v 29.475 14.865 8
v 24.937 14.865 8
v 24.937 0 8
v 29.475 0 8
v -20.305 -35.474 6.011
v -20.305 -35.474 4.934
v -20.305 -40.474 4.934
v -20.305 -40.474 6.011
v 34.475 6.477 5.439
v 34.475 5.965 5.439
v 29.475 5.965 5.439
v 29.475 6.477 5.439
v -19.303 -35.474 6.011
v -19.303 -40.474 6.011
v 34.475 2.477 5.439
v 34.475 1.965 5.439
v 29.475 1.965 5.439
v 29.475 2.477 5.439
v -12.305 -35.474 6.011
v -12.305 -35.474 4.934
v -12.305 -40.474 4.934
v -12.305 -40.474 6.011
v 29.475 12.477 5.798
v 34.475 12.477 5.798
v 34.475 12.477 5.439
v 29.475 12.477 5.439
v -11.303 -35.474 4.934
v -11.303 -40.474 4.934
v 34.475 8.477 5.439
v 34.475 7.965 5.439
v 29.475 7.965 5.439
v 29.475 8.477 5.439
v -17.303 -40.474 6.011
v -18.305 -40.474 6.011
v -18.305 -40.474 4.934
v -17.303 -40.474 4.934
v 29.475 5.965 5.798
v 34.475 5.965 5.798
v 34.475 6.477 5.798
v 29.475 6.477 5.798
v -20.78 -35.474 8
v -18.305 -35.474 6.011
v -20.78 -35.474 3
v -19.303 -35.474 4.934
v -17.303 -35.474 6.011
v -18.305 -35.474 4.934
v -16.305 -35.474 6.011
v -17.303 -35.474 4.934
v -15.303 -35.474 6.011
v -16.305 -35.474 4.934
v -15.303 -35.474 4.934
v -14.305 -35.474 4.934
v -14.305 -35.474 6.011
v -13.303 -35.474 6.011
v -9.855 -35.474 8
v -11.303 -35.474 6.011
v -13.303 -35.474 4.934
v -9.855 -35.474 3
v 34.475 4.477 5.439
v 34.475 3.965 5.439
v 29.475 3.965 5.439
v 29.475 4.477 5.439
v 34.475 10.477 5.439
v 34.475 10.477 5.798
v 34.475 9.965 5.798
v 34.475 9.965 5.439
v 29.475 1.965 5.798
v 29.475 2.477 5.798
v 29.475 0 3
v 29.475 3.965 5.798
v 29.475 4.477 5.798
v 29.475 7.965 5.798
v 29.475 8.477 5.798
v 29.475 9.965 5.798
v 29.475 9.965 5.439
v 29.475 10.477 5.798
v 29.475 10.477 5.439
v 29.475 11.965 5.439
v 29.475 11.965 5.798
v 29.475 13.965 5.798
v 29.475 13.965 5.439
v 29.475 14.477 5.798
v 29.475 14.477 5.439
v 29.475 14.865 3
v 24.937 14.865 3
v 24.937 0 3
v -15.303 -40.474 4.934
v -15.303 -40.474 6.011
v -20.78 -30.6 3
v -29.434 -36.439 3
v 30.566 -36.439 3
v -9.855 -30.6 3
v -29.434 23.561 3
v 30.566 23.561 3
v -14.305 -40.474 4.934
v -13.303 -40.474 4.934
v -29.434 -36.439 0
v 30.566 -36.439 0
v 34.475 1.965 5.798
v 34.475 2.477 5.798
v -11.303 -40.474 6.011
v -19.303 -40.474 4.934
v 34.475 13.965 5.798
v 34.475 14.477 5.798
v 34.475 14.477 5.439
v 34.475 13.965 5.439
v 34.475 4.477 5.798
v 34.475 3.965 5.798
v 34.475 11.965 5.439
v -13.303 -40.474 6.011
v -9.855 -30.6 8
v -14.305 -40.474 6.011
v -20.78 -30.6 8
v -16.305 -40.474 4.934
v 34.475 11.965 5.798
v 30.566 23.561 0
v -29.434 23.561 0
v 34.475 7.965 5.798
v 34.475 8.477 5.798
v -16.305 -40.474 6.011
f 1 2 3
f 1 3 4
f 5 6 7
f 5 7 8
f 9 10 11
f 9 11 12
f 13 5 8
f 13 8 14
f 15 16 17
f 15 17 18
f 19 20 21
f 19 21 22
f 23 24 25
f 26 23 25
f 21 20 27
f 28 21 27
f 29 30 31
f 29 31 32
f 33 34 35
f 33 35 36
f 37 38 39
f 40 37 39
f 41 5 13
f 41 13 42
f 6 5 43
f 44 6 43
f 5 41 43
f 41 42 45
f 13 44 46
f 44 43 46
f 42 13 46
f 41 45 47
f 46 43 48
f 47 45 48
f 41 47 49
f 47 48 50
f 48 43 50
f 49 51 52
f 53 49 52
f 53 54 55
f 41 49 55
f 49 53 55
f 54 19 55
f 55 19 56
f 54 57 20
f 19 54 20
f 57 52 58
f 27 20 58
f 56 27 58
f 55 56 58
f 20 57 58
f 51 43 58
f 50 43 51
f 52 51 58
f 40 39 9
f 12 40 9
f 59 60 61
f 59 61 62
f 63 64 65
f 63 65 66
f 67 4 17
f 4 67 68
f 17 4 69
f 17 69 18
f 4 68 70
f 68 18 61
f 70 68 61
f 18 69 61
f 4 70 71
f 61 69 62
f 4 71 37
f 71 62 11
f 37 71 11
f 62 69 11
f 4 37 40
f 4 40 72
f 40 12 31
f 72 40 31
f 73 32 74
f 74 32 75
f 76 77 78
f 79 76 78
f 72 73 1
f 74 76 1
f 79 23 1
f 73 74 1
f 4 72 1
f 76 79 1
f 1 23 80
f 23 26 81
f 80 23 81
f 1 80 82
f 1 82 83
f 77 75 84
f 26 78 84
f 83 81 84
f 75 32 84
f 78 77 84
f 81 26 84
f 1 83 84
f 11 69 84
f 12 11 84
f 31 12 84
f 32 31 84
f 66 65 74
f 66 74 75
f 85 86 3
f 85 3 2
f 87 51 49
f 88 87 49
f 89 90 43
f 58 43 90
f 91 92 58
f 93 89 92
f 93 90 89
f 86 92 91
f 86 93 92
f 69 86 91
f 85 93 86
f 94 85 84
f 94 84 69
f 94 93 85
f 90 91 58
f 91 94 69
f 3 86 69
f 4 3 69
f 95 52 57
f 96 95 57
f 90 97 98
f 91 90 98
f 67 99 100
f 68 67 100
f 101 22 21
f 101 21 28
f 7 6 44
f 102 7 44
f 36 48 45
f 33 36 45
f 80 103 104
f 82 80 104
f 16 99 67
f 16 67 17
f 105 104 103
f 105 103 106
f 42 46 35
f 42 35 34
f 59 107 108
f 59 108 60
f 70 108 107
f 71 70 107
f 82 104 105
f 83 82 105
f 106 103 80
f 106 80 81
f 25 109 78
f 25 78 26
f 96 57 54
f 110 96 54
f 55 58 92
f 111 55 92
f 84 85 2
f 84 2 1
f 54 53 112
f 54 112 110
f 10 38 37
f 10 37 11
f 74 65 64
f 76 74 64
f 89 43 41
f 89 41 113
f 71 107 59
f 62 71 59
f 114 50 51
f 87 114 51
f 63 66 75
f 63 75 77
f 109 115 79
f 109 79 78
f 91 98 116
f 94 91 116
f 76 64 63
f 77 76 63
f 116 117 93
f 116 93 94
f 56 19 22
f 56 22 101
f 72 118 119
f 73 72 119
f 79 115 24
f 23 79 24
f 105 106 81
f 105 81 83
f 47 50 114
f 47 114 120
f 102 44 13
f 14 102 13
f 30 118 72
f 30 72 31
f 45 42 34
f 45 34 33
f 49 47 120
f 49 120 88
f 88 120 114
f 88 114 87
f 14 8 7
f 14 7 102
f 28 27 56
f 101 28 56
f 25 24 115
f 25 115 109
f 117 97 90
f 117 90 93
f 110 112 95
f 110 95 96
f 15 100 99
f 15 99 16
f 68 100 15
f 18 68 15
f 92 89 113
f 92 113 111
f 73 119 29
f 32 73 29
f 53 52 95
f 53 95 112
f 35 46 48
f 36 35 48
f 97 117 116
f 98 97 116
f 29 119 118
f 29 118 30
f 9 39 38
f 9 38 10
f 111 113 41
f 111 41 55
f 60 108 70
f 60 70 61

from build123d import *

# Parameters (mm, degrees)
SKETCH2_W           = 60
SKETCH2_H           = 60
BOSS_EXTRUDE1_DEPTH = 3
SKETCH3_W           = 10.924948593
SKETCH3_H           = 4.874207834
SKETCH3_W_2         = 4.538055569
SKETCH3_H_2         = 14.86497051
BOSS_EXTRUDE2_DEPTH = 5
SKETCH4_W           = 1.00253682
SKETCH4_H           = 1.076798806
BOSS_EXTRUDE3_DEPTH = 5
LPATTERN1_COUNT     = 5
LPATTERN1_PITCH     = 2
SKETCH5_W           = 0.358984387
SKETCH5_H           = 0.512834838
BOSS_EXTRUDE4_DEPTH = 5
LPATTERN2_COUNT     = 7
LPATTERN2_PITCH     = 2


with BuildPart() as part:
    # Sketch2 → Boss-Extrude1 (new body)
    with BuildSketch(Plane.XY):
        with Locations((0.566037736, -6.438679245)):
            Rectangle(SKETCH2_W, SKETCH2_H)
    extrude(amount=BOSS_EXTRUDE1_DEPTH)

    # Sketch3 → Boss-Extrude2 (add)
    with BuildSketch(Plane.XY.offset(3)):
        with Locations((-15.317156757, -33.036727165)):
            Rectangle(SKETCH3_W, SKETCH3_H)
        with Locations((27.206104689, 7.432485255)):
            Rectangle(SKETCH3_W_2, SKETCH3_H_2)
    extrude(amount=BOSS_EXTRUDE2_DEPTH)

    # Sketch4 → Boss-Extrude3 (add)
    with BuildSketch(Plane.XZ.offset(35.473831082)):
        with Locations((-19.804086394, 5.472695433)):
            Rectangle(SKETCH4_W, SKETCH4_H)
    boss_extrude3 = extrude(amount=BOSS_EXTRUDE3_DEPTH)

    # LPattern1: Boss-Extrude3 ×5
    with Locations(*[(i * LPATTERN1_PITCH, 0, 0) for i in range(1, LPATTERN1_COUNT)]):
        add(boss_extrude3)

    # Sketch5 → Boss-Extrude4 (add)
    with BuildSketch(Plane(origin=(29.475132473, 0, 0), x_dir=(0, 0, -1), z_dir=(1, 0, 0))):
        with Locations((-5.618353943, 14.22099245)):
            Rectangle(SKETCH5_W, SKETCH5_H)
    boss_extrude4 = extrude(amount=BOSS_EXTRUDE4_DEPTH)

    # LPattern2: Boss-Extrude4 ×7
    with Locations(*[(0, -i * LPATTERN2_PITCH, 0) for i in range(1, LPATTERN2_COUNT)]):
        add(boss_extrude4)


solid = part.part
